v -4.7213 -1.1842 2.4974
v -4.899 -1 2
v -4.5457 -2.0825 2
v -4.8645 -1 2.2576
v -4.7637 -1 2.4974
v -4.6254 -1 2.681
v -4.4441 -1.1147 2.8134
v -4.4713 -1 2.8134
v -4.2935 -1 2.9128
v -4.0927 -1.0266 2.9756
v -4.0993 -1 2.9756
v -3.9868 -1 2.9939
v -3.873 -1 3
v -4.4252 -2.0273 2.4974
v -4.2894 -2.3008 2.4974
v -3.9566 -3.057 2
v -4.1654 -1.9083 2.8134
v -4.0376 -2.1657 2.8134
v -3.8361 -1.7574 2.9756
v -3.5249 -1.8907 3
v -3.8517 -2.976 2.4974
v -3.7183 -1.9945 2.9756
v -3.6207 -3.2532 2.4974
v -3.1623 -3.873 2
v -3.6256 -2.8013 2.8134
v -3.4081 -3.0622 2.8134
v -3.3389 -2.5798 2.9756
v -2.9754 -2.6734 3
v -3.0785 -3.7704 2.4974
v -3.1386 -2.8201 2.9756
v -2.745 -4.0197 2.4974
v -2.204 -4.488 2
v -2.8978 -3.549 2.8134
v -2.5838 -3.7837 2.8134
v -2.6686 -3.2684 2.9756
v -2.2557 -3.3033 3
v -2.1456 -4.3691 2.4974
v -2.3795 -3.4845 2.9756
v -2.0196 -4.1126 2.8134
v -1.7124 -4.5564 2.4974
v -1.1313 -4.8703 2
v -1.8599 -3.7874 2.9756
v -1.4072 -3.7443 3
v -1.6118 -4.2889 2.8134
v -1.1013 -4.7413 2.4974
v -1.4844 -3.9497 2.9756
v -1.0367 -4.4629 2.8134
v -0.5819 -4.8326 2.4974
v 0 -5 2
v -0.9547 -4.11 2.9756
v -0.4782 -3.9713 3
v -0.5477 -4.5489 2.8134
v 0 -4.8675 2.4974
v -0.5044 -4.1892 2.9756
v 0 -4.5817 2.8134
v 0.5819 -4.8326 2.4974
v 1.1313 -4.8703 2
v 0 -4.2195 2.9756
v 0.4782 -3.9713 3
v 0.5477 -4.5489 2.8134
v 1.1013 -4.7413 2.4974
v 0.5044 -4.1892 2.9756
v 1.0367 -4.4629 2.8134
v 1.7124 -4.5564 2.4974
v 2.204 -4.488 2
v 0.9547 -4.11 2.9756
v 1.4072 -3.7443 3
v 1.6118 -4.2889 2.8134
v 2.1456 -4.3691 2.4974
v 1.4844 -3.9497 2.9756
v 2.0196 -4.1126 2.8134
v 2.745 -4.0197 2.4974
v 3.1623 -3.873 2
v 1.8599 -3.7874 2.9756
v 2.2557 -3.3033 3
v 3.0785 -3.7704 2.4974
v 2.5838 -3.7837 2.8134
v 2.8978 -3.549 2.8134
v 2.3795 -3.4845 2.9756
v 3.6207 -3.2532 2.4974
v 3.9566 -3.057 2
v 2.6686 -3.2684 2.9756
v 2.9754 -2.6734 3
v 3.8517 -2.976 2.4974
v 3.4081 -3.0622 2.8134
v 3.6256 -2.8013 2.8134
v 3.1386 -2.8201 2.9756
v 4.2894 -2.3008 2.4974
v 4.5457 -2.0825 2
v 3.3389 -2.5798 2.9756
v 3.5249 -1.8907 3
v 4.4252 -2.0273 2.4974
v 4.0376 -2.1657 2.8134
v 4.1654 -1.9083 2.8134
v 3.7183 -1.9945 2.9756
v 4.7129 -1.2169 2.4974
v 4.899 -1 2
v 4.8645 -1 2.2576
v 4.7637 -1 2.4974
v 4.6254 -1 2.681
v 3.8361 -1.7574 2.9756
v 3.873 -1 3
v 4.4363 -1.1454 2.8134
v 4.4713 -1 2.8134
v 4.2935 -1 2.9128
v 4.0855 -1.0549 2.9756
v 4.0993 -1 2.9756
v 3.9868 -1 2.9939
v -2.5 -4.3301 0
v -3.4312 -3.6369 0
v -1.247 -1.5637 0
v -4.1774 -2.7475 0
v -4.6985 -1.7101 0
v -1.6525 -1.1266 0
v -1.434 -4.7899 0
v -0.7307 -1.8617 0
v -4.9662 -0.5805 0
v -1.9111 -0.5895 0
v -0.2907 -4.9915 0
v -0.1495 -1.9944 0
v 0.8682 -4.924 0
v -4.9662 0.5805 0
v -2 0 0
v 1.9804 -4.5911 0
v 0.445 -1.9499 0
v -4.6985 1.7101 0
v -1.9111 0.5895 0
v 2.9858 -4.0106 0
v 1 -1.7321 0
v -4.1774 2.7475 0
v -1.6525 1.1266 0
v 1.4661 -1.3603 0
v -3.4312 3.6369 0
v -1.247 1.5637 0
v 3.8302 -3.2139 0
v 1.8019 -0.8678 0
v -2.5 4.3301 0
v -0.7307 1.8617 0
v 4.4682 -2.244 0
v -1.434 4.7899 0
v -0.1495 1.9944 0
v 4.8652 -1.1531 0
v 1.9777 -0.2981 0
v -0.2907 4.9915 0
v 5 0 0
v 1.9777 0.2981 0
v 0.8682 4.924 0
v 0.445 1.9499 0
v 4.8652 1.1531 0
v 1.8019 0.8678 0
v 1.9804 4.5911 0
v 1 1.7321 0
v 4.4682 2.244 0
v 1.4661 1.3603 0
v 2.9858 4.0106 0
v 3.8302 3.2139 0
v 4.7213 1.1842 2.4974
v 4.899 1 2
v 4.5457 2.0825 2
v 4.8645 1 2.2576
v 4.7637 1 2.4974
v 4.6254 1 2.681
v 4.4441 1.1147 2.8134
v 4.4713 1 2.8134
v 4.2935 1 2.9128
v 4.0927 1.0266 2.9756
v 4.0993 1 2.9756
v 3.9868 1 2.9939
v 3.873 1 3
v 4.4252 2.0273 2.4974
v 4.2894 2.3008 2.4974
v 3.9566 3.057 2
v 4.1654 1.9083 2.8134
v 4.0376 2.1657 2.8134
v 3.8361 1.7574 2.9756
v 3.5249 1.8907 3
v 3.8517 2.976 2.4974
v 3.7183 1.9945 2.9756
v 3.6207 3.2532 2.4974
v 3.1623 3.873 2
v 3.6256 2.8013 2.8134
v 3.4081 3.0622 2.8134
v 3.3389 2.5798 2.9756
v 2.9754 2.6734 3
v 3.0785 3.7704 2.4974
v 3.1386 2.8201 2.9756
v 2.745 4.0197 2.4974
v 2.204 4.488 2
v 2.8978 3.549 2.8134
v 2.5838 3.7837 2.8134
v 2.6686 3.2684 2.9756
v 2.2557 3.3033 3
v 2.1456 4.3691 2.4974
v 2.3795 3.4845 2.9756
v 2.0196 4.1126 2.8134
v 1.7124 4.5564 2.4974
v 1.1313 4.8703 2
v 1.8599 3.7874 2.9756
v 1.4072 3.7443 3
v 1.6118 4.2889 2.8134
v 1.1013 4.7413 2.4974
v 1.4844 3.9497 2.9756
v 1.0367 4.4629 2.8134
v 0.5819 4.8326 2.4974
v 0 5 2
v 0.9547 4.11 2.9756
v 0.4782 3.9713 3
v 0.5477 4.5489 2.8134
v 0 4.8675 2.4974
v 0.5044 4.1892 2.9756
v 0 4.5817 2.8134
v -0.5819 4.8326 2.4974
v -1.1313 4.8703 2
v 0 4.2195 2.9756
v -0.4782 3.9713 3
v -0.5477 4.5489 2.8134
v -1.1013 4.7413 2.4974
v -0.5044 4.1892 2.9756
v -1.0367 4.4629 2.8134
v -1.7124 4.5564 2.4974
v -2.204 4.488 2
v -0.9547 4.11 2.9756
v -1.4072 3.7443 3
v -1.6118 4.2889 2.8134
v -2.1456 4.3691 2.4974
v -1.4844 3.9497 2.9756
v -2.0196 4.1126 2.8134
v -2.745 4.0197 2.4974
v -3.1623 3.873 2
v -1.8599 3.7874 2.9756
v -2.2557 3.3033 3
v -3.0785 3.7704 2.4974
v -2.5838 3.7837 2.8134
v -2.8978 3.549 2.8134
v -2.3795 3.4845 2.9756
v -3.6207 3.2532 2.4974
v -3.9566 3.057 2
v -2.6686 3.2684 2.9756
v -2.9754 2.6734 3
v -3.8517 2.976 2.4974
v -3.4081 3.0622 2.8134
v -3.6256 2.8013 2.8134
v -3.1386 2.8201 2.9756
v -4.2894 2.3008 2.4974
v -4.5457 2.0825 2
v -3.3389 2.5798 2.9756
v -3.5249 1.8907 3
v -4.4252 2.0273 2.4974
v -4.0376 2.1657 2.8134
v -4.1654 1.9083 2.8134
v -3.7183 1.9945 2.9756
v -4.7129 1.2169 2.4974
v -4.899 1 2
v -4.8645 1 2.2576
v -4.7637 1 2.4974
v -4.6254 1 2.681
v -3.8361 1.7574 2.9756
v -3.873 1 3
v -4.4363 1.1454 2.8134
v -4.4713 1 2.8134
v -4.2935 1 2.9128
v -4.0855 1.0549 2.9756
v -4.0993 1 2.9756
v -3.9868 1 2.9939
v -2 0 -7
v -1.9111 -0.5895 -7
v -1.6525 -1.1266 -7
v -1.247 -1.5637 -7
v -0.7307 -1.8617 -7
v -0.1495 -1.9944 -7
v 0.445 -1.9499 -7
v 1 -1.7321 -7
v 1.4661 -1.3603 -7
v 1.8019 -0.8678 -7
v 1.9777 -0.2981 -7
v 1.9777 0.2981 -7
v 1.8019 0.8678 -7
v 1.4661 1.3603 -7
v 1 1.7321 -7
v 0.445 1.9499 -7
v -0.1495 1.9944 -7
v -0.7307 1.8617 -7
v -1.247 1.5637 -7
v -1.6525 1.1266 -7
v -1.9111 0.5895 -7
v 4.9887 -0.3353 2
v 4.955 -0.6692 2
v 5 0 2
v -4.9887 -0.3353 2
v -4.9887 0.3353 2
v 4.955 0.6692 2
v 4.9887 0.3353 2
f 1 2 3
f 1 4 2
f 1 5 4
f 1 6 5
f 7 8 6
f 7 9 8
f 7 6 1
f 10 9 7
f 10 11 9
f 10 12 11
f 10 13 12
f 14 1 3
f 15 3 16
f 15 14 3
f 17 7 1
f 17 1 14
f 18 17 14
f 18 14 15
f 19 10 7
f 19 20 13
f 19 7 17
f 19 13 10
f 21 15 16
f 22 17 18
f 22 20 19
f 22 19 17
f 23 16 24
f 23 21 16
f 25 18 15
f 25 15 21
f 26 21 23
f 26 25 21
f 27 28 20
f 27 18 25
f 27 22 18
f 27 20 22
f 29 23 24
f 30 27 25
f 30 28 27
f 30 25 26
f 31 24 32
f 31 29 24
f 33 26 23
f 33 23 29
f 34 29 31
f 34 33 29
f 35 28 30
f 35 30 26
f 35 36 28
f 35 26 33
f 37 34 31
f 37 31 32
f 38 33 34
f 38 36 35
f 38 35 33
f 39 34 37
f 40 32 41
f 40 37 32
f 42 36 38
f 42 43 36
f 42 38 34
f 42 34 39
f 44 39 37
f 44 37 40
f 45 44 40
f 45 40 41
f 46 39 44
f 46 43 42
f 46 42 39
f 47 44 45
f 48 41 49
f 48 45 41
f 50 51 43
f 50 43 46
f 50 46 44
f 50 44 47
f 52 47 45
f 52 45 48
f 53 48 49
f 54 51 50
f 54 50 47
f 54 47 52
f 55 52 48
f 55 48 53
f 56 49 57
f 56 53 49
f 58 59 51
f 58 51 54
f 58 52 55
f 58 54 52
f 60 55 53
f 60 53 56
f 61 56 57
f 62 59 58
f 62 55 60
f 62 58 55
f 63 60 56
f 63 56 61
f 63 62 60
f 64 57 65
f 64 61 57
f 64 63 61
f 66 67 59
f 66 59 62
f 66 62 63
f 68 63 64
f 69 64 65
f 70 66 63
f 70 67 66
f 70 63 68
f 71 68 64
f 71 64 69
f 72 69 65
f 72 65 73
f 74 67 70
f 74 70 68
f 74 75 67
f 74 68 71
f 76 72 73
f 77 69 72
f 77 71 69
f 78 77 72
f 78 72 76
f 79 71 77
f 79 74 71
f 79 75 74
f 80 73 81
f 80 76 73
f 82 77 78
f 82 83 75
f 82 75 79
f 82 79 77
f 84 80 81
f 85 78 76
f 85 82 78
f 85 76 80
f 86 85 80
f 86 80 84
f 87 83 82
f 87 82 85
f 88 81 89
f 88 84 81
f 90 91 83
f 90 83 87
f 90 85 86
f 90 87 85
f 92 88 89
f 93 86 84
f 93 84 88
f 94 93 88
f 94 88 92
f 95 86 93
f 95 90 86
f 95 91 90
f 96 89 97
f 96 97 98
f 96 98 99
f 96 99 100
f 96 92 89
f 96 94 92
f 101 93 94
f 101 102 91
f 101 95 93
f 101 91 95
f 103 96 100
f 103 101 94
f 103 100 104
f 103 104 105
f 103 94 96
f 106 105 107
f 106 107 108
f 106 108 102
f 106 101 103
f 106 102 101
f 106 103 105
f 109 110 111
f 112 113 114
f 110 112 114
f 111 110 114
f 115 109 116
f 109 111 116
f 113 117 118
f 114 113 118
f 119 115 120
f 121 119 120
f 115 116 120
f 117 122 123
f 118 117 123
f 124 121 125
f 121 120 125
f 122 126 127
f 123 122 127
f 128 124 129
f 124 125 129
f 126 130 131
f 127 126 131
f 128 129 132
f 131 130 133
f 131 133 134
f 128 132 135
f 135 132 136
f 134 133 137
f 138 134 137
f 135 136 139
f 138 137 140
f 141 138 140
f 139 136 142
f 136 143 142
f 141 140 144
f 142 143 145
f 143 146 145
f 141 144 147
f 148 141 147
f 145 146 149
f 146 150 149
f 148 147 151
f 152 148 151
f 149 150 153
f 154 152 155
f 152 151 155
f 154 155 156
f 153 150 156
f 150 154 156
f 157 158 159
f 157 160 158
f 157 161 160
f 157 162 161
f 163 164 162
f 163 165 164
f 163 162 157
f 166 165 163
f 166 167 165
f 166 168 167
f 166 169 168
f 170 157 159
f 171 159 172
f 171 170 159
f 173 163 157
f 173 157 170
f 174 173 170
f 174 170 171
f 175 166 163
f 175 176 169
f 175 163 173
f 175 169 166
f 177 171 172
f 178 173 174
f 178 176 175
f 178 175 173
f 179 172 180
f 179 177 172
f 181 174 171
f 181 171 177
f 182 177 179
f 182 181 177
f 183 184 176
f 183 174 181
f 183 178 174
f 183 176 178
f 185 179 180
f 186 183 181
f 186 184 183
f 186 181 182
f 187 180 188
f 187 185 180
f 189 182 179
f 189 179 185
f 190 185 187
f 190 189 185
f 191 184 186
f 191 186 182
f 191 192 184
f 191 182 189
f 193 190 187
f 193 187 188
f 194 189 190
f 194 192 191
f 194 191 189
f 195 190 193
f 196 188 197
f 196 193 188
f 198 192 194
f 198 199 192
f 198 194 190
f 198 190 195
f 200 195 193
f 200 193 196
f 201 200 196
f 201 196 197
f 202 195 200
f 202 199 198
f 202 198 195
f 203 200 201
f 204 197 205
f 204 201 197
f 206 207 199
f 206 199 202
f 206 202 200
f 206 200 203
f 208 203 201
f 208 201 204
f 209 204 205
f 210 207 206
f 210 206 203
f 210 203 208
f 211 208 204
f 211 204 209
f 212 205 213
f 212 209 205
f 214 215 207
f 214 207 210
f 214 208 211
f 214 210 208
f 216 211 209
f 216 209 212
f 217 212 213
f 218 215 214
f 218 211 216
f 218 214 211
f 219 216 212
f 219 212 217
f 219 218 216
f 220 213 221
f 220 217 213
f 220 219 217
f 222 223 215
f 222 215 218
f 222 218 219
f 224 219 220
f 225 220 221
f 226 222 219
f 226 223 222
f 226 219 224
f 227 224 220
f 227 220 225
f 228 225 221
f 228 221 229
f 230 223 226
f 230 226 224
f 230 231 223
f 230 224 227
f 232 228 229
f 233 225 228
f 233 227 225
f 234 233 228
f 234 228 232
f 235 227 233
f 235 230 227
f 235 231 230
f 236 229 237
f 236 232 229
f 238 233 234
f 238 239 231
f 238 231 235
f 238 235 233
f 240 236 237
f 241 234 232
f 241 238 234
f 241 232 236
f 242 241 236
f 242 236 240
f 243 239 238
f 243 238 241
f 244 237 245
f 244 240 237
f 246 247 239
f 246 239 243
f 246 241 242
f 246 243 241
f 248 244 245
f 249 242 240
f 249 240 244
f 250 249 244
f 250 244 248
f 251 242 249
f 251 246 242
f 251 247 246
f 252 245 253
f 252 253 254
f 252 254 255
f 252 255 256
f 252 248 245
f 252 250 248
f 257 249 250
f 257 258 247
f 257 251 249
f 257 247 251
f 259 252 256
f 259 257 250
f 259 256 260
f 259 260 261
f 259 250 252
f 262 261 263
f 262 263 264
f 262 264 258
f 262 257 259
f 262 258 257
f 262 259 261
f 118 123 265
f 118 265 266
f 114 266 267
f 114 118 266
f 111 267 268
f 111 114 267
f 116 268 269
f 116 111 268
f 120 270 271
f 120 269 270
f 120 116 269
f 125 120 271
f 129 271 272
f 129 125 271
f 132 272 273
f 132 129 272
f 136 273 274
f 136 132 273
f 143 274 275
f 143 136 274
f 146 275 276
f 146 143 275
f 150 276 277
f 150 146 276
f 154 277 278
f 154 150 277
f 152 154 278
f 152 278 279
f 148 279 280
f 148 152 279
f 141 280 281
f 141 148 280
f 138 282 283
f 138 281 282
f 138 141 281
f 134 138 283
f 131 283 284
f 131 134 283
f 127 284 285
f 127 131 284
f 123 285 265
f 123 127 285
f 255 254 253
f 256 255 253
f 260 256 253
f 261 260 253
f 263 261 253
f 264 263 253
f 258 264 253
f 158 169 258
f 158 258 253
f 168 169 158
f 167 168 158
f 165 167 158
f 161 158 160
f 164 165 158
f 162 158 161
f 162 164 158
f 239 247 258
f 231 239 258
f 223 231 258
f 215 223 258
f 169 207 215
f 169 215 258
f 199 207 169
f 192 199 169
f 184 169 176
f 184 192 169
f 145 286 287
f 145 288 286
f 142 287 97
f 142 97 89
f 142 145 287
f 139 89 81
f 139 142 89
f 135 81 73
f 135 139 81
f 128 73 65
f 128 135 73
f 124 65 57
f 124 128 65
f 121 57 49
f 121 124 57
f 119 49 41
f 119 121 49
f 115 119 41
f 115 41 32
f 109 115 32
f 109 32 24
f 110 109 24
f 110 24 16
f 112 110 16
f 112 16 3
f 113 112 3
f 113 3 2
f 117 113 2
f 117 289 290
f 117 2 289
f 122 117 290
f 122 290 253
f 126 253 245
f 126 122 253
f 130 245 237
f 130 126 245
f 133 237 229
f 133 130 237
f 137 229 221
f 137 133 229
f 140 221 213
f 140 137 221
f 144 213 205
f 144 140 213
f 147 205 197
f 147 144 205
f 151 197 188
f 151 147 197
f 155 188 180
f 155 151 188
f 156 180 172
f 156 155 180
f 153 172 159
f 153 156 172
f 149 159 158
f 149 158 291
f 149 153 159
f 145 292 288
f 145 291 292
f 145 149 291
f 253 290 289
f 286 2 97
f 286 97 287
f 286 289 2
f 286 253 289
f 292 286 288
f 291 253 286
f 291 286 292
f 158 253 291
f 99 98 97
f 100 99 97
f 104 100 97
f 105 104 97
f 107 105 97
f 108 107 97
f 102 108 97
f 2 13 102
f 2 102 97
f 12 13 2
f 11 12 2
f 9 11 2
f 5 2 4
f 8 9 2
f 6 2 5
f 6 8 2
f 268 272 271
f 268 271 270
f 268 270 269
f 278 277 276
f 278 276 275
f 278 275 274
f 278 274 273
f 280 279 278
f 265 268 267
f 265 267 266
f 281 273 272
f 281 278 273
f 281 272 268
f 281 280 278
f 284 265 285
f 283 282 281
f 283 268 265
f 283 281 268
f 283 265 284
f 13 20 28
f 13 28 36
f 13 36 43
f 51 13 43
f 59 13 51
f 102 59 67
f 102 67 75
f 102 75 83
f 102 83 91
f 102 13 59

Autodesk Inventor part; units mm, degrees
ref_plane "YZ Plane" through (0, 0, 0) normal (1, 0, 0) x (0, 1, 0)
ref_plane "XZ Plane" through (0, 0, 0) normal (0, 1, 0) x (-1, 0, 0)
ref_plane "XY Plane" through (0, 0, 0) normal (0, 0, 1) x (1, 0, 0)
sketch "Sketch1" plane through (0, 0, 0) normal (0, 0, 1) x (1, 0, 0)
  circle A0 centre (0, 0) radius 5
  dimension "d0" = 10
extrude "Extrusion1" add sketch "Sketch1" along normal blind 3
sketch "Sketch2" plane through (0, 0, 3) normal (0, 0, 1) x (1, 0, 0)
  circle A0 centre (0, 0) radius 5 projected
  line L0 (-4.899, 1) -> (4.899, 1)
  line L1 (7.3763, 1) -> (7.3763, -1)
  line L2 (4.899, -1) -> (-4.899, -1)
  line L3 (-7.3763, -1) -> (-7.3763, 1)
  line L4 (-7.3763, 1) -> (7.3763, -1) construction
  line L5 (7.3763, 1) -> (-7.3763, -1) construction
  circle A1 centre (0, 0) radius 5 projected
  dimension "d3" = 2
  dimension "d4" = 82.28
  dimension "d5" = 82.28
  dimension "d6" = 2
  dimension "d7" = 1
extrude "Extrusion2" cut sketch "Sketch2" against normal blind 1 contours A0 L2 L0
fillet "Fillet1" radius 1 2 edges at (0, 5, 3) (0, -5, 3)
sketch "Sketch3" plane through (0, 0, 0) normal (0, 0, -1) x (-1, 0, 0)
  circle A0 centre (0, 0) radius 5 projected
  circle A1 centre (0, 0) radius 2
  dimension "d11" = 4
extrude "Extrusion3" add sketch "Sketch3" along normal blind 7 contours A1
thread "Thread1" size "M4x0.7" class "6g" standard "ANSI Metric M Profile" length 7
properties part number "17A - Crosshead pin1" material "Steel AISI 1020 107 HR"
